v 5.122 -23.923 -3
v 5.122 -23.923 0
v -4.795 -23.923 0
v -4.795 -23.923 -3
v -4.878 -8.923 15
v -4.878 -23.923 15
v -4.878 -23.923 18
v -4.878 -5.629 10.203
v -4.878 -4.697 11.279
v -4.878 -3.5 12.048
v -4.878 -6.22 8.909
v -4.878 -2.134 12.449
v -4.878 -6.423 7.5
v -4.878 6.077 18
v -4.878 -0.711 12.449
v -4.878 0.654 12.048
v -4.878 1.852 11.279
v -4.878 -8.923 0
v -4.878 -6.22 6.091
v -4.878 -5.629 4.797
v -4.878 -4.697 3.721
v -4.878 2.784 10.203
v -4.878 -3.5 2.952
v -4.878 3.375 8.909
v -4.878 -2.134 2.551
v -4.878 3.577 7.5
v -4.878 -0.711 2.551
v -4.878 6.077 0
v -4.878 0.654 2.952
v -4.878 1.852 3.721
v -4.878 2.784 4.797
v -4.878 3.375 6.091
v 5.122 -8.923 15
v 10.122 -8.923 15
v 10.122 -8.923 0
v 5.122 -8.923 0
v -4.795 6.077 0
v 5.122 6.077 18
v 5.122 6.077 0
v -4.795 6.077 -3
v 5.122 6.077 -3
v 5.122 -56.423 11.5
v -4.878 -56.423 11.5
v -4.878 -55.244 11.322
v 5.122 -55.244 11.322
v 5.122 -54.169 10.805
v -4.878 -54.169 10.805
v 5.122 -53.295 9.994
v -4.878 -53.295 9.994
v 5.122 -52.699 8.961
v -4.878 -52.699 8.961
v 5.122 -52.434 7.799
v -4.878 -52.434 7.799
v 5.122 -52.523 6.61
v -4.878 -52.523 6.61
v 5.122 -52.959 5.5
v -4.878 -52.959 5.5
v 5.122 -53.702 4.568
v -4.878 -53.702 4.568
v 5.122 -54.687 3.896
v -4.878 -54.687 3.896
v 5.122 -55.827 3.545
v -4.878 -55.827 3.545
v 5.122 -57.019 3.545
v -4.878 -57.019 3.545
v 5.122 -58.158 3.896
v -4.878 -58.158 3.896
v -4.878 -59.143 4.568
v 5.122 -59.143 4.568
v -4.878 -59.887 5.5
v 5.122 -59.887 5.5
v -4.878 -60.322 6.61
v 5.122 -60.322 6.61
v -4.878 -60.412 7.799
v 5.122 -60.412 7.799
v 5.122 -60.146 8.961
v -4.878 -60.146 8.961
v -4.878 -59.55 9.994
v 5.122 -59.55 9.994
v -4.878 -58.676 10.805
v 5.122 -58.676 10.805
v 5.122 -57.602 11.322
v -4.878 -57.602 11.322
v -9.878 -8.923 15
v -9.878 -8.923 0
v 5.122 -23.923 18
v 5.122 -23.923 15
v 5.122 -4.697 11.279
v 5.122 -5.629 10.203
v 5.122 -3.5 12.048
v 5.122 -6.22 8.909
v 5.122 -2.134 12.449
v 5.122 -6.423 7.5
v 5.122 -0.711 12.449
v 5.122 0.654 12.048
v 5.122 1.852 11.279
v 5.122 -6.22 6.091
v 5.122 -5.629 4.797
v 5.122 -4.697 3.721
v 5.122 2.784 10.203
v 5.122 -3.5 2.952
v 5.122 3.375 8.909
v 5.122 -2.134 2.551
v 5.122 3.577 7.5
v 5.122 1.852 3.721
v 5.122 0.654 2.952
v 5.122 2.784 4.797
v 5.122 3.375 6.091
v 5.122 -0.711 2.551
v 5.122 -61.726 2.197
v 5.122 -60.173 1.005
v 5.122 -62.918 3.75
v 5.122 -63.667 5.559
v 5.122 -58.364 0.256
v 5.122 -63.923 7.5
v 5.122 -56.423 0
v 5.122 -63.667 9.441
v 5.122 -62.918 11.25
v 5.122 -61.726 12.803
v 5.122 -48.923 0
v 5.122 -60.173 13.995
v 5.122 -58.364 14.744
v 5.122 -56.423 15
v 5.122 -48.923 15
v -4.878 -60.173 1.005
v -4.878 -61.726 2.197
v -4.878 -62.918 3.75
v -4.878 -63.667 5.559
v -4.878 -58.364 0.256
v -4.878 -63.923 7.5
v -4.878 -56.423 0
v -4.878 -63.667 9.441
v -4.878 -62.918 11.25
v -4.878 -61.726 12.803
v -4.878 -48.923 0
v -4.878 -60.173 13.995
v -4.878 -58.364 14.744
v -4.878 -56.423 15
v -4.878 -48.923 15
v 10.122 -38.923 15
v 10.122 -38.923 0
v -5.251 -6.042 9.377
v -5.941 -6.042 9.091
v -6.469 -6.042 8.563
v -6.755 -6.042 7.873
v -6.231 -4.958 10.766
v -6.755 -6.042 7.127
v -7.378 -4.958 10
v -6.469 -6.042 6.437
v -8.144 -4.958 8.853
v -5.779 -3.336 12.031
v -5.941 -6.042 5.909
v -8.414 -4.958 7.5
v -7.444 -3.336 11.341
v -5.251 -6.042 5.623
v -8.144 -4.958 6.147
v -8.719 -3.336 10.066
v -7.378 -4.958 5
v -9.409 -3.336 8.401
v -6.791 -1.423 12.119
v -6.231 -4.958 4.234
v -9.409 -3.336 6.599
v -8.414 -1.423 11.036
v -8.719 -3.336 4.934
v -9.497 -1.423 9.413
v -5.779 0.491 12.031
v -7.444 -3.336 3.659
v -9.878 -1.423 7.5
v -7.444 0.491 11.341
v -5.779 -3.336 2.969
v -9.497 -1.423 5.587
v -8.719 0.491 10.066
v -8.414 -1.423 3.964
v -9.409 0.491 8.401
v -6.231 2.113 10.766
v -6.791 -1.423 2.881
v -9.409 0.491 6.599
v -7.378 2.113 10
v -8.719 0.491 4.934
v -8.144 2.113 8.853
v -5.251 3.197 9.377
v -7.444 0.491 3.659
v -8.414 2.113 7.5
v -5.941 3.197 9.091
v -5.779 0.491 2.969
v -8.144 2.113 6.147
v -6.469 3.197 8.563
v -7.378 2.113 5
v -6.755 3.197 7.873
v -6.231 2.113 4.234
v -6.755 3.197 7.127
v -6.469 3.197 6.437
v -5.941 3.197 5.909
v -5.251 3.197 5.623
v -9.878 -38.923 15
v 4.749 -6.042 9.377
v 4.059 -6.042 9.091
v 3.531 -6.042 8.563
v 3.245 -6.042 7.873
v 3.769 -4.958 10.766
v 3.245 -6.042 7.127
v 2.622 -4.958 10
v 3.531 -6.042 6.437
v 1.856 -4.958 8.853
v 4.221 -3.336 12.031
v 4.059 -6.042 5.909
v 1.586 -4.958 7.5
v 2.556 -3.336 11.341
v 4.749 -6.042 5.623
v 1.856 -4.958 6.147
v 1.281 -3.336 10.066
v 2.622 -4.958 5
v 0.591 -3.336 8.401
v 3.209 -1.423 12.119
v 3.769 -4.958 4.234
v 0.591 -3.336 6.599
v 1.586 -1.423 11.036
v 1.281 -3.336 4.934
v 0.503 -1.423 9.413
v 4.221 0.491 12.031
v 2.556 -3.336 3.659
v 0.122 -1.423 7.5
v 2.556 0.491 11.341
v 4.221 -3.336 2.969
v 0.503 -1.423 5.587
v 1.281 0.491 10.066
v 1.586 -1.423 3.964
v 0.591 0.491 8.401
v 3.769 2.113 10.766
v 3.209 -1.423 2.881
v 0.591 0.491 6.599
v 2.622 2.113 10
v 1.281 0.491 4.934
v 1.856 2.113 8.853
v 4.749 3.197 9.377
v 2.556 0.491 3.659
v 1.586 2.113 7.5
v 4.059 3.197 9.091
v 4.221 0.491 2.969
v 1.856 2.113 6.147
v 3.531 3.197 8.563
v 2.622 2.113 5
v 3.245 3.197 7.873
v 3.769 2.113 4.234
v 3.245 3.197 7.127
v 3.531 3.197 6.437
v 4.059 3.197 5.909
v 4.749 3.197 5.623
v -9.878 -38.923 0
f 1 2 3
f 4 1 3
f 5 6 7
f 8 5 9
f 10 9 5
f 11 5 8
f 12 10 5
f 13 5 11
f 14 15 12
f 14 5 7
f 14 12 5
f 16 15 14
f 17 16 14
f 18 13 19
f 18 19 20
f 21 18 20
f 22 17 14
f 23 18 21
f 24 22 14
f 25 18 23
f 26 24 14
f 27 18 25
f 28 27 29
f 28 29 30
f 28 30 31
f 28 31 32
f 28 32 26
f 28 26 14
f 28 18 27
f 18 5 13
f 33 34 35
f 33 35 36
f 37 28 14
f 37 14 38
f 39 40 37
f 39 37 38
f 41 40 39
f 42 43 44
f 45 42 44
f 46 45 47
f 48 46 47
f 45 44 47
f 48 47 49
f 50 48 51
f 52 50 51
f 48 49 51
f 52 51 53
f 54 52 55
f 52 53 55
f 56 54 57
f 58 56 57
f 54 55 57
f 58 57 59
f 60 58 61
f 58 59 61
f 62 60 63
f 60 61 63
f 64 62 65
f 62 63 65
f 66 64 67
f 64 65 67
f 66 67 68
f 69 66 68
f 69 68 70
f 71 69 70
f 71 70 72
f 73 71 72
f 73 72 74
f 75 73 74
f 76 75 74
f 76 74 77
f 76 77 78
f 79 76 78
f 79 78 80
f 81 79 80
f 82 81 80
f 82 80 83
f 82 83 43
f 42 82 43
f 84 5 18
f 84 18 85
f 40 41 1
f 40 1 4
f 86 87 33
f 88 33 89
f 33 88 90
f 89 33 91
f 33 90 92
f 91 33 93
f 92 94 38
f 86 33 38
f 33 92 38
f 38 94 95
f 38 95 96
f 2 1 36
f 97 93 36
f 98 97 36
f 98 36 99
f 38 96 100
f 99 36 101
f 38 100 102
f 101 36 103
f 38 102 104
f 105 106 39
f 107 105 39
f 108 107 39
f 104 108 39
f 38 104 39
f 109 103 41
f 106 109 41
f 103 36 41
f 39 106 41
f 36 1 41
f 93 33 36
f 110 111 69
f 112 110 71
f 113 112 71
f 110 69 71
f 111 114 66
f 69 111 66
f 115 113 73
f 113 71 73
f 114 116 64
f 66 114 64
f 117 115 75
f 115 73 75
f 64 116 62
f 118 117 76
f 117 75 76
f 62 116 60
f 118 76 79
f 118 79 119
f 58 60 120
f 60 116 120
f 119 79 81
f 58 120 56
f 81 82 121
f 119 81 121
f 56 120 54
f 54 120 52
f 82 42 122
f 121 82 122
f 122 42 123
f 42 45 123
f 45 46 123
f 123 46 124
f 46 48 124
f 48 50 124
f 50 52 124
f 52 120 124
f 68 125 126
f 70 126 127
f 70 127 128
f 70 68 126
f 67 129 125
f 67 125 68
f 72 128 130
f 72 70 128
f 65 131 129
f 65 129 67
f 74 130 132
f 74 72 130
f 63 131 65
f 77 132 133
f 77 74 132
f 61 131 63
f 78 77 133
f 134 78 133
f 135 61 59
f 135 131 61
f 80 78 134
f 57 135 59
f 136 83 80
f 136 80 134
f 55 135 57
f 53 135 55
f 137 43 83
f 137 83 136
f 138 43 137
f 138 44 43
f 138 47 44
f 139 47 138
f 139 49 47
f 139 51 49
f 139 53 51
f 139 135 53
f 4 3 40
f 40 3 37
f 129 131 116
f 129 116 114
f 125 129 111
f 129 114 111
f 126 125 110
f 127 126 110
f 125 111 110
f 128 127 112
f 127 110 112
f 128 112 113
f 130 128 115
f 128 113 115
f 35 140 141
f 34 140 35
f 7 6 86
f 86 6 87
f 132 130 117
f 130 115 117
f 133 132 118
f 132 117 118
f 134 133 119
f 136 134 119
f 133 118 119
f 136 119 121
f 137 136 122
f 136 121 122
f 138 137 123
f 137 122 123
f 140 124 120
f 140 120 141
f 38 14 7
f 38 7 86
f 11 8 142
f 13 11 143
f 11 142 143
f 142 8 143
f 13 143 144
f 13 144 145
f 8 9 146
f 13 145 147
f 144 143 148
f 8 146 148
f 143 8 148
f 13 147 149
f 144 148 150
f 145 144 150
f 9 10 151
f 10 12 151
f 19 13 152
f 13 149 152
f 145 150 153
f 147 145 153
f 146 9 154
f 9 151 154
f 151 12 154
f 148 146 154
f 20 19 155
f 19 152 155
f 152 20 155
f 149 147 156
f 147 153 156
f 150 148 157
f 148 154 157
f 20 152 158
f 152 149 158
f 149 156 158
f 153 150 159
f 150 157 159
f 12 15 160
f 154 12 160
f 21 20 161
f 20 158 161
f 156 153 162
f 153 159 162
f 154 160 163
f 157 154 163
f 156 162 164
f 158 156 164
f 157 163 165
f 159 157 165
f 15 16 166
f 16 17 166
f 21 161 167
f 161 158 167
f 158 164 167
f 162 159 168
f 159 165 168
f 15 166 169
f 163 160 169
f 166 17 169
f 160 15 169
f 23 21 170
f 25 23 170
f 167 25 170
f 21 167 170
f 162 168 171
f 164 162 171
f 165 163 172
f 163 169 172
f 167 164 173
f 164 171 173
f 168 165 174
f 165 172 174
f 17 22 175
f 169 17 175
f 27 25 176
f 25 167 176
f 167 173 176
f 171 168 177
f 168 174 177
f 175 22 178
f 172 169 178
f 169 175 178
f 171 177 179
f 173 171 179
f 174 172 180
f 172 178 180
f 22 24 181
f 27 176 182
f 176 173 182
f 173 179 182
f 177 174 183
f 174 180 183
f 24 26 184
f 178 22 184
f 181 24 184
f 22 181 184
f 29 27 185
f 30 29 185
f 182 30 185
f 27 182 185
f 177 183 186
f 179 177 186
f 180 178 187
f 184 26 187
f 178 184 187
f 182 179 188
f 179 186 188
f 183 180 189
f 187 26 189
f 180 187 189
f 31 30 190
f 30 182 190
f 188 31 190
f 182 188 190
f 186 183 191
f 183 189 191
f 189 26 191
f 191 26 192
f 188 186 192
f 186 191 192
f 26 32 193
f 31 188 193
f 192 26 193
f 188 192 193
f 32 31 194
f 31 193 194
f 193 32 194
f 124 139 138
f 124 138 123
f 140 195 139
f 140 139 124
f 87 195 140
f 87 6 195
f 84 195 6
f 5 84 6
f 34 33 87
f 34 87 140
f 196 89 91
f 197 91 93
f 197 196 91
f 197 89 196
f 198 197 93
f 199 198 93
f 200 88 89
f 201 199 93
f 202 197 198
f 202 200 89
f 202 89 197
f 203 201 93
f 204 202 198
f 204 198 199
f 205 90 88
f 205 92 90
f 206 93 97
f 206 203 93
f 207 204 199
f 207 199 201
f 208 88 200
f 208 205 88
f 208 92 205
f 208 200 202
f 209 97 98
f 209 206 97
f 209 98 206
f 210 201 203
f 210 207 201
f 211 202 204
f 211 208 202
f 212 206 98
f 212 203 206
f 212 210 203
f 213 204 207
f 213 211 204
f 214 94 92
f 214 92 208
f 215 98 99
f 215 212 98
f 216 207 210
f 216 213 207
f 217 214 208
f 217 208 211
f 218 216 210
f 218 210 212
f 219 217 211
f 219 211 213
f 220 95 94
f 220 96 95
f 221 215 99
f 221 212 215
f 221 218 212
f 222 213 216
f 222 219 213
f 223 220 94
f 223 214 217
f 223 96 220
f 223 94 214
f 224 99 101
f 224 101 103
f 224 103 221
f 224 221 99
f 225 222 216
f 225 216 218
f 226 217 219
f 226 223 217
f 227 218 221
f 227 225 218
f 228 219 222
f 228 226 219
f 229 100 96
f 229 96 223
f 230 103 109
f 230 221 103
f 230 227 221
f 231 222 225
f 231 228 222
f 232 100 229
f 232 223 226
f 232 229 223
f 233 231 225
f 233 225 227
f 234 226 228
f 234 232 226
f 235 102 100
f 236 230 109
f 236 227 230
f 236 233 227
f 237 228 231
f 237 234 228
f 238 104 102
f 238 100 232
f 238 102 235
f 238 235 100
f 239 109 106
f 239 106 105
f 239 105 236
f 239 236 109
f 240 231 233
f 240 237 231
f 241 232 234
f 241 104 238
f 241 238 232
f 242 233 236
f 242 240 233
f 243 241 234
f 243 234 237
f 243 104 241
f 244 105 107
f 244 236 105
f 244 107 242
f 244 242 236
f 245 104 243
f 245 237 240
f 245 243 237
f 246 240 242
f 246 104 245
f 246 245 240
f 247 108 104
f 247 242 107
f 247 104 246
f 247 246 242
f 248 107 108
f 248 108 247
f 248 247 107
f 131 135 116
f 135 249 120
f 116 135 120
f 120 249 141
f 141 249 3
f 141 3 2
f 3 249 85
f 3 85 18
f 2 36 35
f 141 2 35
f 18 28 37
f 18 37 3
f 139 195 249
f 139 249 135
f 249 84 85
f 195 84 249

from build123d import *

# Parameters (mm, degrees)
SKETCH1_W            = 10
SKETCH1_H            = 30
BOSS_EXTRUDE1_DEPTH  = 15
BOSS_EXTRUDE5_DEPTH  = 15
SKETCH7_W            = 9.916734627
SKETCH7_H            = 30
BOSS_EXTRUDE7_DEPTH  = 3
SKETCH12_W           = 10
SKETCH12_H           = 15
BOSS_EXTRUDE9_DEPTH  = 15
SKETCH13_R           = 4
CUT_EXTRUDE3_DEPTH   = 15
FILLET2_R            = 7.5
SKETCH6_W            = 10
SKETCH6_H            = 30
BOSS_EXTRUDE11_DEPTH = 3


with BuildPart() as part:
    # Sketch1 → Boss-Extrude1 (new body)
    with BuildSketch(Plane.XY):
        with Locations((0.12195122, -8.922764228)):
            Rectangle(SKETCH1_W, SKETCH1_H)
    extrude(amount=BOSS_EXTRUDE1_DEPTH)

    # Sketch2 → Boss-Extrude5 (add)
    with BuildSketch(Plane.XY.offset(15)):
        Polygon((-4.87804878, -8.922764228), (-9.87804878, -8.922764228), (-9.87804878, -38.922764228), (-4.87804878, -48.922764228), (5.12195122, -48.922764228), (10.12195122, -38.922764228), (10.12195122, -8.922764228), (5.12195122, -8.922764228), (5.12195122, -23.922764228), (-4.87804878, -23.922764228), align=None)
    extrude(amount=-BOSS_EXTRUDE5_DEPTH)

    # Sketch7 → Boss-Extrude7 (add)
    with BuildSketch(Plane(origin=(0, 0, 0), x_dir=(-1, 0, 0), z_dir=(0, 0, -1))):
        with Locations((-0.163583906, -8.922764228)):
            Rectangle(SKETCH7_W, SKETCH7_H)
    extrude(amount=BOSS_EXTRUDE7_DEPTH)

    # Sketch12 → Boss-Extrude9 (add)
    with BuildSketch(Plane.XZ.offset(48.922764228)):
        with Locations((0.12195122, 7.5)):
            Rectangle(SKETCH12_W, SKETCH12_H)
    extrude(amount=BOSS_EXTRUDE9_DEPTH)

    # Sketch13 → Cut-Extrude3 (cut)
    with BuildSketch(Plane.ZY.offset(4.87804878)):
        with Locations((7.5, -56.422764228)):
            Circle(SKETCH13_R)
    extrude(amount=-CUT_EXTRUDE3_DEPTH, mode=Mode.SUBTRACT)

    # Fillet2
    fillet2_edges = [part.edges().sort_by_distance(p)[0] for p in [
        (0.12195122, -63.922764228, 0),
        (0.12195122, -63.922764228, 15),
    ]]
    fillet(fillet2_edges, radius=FILLET2_R - 0.0001)  # a hair under: the kernel refuses the full size

    # Sketch10 → Revolve3 (revolve)
    with BuildSketch(Plane.ZY.offset(4.87804878)):
        with BuildLine():
            Line((7.5, 3.577235772), (7.5, -6.422764228))
            ThreePointArc((7.5, -6.422764228), (2.5, -1.422764228), (7.5, 3.577235772))
        make_face()
    revolve(axis=Axis((-4.87804878, 3.577235772, 7.5), (0, -1, 0)))

    # Sketch15 → Cut-Revolve1 (revolve, cut)
    with BuildSketch(Plane(origin=(5.12195122, 0, 0), x_dir=(0, 0, -1), z_dir=(1, 0, 0))):
        with BuildLine():
            Line((-7.5, 3.577235772), (-7.5, -6.422764228))
            ThreePointArc((-7.5, -6.422764228), (-12.5, -1.422764228), (-7.5, 3.577235772))
        make_face()
    revolve(axis=Axis((5.12195122, 3.577235772, 7.5), (0, -1, 0)), mode=Mode.SUBTRACT)

    # Sketch6 → Boss-Extrude11 (add)
    with BuildSketch(Plane.XY.offset(15)):
        with Locations((0.12195122, -8.922764228)):
            Rectangle(SKETCH6_W, SKETCH6_H)
    extrude(amount=BOSS_EXTRUDE11_DEPTH)


solid = part.part
